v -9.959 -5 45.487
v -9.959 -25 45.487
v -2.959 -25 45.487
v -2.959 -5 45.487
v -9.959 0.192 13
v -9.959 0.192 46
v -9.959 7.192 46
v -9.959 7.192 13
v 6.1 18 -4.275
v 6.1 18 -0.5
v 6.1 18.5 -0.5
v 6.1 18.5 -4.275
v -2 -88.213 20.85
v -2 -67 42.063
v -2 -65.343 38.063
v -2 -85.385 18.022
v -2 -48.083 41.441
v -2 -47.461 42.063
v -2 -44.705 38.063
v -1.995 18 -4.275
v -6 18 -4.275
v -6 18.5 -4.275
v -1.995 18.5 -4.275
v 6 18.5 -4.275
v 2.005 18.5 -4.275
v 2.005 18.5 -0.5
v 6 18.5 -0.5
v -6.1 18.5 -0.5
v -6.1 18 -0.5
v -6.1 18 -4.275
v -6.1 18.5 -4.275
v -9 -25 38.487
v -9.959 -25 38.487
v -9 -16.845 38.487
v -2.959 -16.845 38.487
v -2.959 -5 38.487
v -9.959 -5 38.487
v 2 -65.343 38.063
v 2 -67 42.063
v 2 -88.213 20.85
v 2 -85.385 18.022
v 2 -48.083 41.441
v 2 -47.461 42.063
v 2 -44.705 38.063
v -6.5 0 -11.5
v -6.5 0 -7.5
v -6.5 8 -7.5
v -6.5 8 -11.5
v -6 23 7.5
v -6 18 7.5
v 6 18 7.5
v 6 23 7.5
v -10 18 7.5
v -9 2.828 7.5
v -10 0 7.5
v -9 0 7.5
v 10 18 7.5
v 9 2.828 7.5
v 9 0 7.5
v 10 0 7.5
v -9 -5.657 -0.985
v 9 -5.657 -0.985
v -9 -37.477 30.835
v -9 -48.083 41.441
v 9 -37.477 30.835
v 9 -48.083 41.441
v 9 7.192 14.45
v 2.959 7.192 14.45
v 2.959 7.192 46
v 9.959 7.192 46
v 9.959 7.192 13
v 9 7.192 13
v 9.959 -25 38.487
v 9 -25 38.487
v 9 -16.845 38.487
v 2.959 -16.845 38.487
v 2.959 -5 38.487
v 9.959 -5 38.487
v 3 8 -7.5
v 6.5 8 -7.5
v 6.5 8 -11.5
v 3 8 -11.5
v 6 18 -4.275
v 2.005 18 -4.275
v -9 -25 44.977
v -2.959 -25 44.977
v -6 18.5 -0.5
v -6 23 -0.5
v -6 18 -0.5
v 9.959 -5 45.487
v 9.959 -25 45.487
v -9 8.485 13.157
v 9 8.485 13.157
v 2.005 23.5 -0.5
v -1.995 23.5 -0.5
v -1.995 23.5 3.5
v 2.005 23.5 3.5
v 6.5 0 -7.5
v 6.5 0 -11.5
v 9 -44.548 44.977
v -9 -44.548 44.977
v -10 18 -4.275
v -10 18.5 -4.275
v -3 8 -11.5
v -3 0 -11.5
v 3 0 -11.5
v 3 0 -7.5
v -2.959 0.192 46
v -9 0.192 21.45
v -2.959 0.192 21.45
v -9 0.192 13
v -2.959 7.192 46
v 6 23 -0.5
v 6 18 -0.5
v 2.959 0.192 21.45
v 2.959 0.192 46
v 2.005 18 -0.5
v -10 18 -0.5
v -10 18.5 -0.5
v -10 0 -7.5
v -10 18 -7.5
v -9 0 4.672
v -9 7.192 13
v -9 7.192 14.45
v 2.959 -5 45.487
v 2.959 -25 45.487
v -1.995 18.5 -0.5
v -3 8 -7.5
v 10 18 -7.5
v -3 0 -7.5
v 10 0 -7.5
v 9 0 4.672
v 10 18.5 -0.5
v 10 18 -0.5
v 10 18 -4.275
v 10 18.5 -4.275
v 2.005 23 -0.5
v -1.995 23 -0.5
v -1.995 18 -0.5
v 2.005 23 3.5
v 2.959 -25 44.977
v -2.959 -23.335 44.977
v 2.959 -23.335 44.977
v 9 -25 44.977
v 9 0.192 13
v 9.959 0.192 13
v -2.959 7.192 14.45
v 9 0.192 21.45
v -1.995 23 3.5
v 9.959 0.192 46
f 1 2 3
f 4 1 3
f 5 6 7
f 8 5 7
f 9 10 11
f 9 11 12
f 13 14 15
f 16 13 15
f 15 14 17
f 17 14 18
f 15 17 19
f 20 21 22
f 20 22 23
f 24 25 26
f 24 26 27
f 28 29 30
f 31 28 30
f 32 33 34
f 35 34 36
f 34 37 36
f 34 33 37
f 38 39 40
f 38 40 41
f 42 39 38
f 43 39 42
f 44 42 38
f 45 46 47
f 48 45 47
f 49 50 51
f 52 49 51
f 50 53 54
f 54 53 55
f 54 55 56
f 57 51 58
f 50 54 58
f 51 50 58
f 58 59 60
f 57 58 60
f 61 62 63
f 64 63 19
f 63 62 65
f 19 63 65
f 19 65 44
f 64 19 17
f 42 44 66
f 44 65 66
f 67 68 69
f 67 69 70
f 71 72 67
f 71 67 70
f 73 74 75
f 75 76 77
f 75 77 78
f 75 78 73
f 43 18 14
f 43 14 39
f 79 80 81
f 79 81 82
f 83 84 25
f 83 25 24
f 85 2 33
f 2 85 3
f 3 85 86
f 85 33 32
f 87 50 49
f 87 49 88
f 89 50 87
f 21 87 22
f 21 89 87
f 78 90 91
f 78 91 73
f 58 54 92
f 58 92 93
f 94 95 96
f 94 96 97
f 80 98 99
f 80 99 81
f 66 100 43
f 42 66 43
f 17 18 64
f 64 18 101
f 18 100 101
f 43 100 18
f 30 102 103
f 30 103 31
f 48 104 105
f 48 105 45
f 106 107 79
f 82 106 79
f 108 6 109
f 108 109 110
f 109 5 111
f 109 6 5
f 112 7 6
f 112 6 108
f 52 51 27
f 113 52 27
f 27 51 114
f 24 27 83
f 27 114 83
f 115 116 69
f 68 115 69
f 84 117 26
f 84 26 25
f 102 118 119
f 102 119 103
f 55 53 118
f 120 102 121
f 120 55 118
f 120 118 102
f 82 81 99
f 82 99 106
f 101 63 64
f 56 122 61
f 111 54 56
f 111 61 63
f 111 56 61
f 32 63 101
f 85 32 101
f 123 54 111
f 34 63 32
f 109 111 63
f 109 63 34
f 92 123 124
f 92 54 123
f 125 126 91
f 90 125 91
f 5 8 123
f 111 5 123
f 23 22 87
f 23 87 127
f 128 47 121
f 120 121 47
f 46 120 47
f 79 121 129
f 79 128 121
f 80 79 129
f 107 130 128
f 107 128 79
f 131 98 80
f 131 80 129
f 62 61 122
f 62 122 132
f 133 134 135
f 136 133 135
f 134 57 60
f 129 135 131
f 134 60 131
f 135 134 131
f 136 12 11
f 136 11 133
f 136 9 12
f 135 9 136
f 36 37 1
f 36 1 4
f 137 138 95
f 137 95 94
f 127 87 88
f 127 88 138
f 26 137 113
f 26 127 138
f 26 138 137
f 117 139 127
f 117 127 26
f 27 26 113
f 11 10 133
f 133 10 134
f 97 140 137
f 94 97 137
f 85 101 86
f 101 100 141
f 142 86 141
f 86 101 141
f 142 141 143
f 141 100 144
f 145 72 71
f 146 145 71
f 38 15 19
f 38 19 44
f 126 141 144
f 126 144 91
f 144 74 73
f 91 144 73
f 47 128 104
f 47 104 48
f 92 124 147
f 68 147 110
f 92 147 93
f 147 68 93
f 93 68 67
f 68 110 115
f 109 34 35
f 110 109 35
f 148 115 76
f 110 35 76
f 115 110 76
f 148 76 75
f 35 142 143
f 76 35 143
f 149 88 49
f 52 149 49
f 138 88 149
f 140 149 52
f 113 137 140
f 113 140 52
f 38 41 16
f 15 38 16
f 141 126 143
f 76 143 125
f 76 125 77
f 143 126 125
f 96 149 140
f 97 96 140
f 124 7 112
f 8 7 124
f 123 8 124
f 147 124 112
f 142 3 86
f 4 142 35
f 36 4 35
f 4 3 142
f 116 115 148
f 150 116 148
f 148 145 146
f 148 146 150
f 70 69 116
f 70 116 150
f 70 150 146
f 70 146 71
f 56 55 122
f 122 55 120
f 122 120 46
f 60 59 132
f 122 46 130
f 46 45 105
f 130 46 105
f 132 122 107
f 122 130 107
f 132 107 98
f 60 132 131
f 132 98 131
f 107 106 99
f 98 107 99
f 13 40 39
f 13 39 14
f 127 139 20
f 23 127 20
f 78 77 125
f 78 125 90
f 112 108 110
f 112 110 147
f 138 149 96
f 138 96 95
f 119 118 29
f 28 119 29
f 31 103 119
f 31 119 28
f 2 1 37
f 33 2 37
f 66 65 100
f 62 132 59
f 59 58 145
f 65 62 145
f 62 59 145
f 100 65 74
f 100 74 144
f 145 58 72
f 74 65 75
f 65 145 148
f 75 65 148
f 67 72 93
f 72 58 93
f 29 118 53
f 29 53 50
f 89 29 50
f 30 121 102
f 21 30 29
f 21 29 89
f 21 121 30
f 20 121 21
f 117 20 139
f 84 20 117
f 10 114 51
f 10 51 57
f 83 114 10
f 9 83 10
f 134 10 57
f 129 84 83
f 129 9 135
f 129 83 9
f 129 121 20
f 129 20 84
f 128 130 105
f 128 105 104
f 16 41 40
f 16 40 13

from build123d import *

# Parameters (mm, degrees)
SKETCH1_W                = 20
SKETCH1_H                = 15
BOSS_EXTRUDE1_DEPTH      = 18
SKETCH2_W                = 12
SKETCH2_H                = 8
BOSS_EXTRUDE2_DEPTH      = 5
SKETCH4_W                = 4
SKETCH4_H                = 4
BOSS_EXTRUDE4_DEPTH      = 0.5
SKETCH3_W                = 3.5
SKETCH3_H                = 8
BOSS_EXTRUDE3_DEPTH      = 4
SKETCH5_W                = 4.004840827
SKETCH5_H                = 3.775181513
SKETCH5_W_2              = 3.995159173
SKETCH5_W_3              = 3.9
BOSS_EXTRUDE5_DEPTH      = 0.5
BOSS_EXTRUDE6_DEPTH      = 2
BOSS_EXTRUDE6_DEPTH_BACK = 43
SKETCH7_W                = 18
SKETCH7_H                = 20
FRONT_START              = 13
SKETCH8_W                = 7
SKETCH8_H                = 7
FRONT_PAWS_DEPTH         = 33
BOSS_EXTRUDE8_DEPTH      = 18
BOSS_EXTRUDE9_START      = -5
SKETCH10_W               = 7
SKETCH10_H               = 7
BOSS_EXTRUDE9_DEPTH      = 20
CHAMFER1_SIZE            = 5
CHAMFER1_SIZE2           = 7.071067812
BOSS_EXTRUDE10_START     = -37
SKETCH11_W               = 4
SKETCH11_H               = 4
BOSS_EXTRUDE10_DEPTH     = 30
SKETCH13_W               = 4
SKETCH13_H               = 4
BOSS_EXTRUDE11_DEPTH     = 30


with BuildPart() as part:
    # Sketch1 → Boss-Extrude1 (new body)
    with BuildSketch(Plane(origin=(0, 0, 0), x_dir=(1, 0, 0), z_dir=(0, 1, 0))):
        Rectangle(SKETCH1_W, SKETCH1_H)
    extrude(amount=BOSS_EXTRUDE1_DEPTH)

    # Sketch2 → Boss-Extrude2 (add)
    with BuildSketch(Plane(origin=(0, 18, 0), x_dir=(1, 0, 0), z_dir=(0, 1, 0))):
        with Locations((0, -3.5)):
            Rectangle(SKETCH2_W, SKETCH2_H)
    extrude(amount=BOSS_EXTRUDE2_DEPTH)

    # Sketch4 → Boss-Extrude4 (add)
    with BuildSketch(Plane(origin=(0, 23, 0), x_dir=(1, 0, 0), z_dir=(0, 1, 0))):
        with Locations((0.004840827, -1.5)):
            Rectangle(SKETCH4_W, SKETCH4_H)
    extrude(amount=BOSS_EXTRUDE4_DEPTH)

    # Sketch3 → Boss-Extrude3 (add)
    with BuildSketch(Plane(origin=(0, 0, -7.5), x_dir=(-1, 0, 0), z_dir=(0, 0, -1))):
        with Locations((-4.75, 4)):
            Rectangle(SKETCH3_W, SKETCH3_H)
        with Locations((4.75, 4)):
            Rectangle(SKETCH3_W, SKETCH3_H)
    extrude(amount=BOSS_EXTRUDE3_DEPTH)

    # Sketch5 → Boss-Extrude5 (add)
    with BuildSketch(Plane(origin=(0, 18, 0), x_dir=(1, 0, 0), z_dir=(0, 1, 0))):
        with Locations((-3.997579587, 2.387590757)):
            Rectangle(SKETCH5_W, SKETCH5_H)
        with Locations((4.002420414, 2.387590757)):
            Rectangle(SKETCH5_W_2, SKETCH5_H)
        with Locations((-8.05, 2.387590757)):
            Rectangle(SKETCH5_W_3, SKETCH5_H)
        with Locations((8.05, 2.387590757)):
            Rectangle(SKETCH5_W_3, SKETCH5_H)
    extrude(amount=BOSS_EXTRUDE5_DEPTH)

    # Sketch7 → Boss-Extrude6 (add, two sides: drawn at the far end of the back side and taken through both)
    with BuildSketch(Plane(origin=(0, -3.75, 3.75), x_dir=(1, 0, 0), z_dir=(0, 0.7071067811865488, -0.7071067811865464)).offset(-BOSS_EXTRUDE6_DEPTH_BACK)):
        with Locations((0, -5.303300859)):
            Rectangle(SKETCH7_W, SKETCH7_H)
    extrude(amount=BOSS_EXTRUDE6_DEPTH + BOSS_EXTRUDE6_DEPTH_BACK)

    # Sketch8 → front paws (add)
    with BuildSketch(Plane.XY.offset(FRONT_START)):
        with Locations((-6.458894343, 3.691922456)):
            Rectangle(SKETCH8_W, SKETCH8_H)
        with Locations((6.458894343, 3.691922456)):
            Rectangle(SKETCH8_W, SKETCH8_H)
    extrude(amount=FRONT_PAWS_DEPTH)

    # Sketch9 → Boss-Extrude8 (add)
    with BuildSketch(Plane(origin=(9, 0, 0), x_dir=(0, 0, -1), z_dir=(1, 0, 0))):
        Polygon((-44.976659403, -23.334523779), (-30.834523779, -37.476659403), (-44.976659403, -51.618795027), align=None)
    extrude(amount=-BOSS_EXTRUDE8_DEPTH)

    # Sketch10 → Boss-Extrude9 (add)
    with BuildSketch(Plane(origin=(0, 0, 0), x_dir=(1, 0, 0), z_dir=(0, 1, 0)).offset(BOSS_EXTRUDE9_START)):
        with Locations((-6.458894343, -41.986772092)):
            Rectangle(SKETCH10_W, SKETCH10_H)
        with Locations((6.458894343, -41.986772092)):
            Rectangle(SKETCH10_W, SKETCH10_H)
    extrude(amount=-BOSS_EXTRUDE9_DEPTH)

    # Chamfer1
    chamfer1_edges = [part.edges().sort_by_distance(p)[0] for p in [
        (0, -51.618795027, 44.976659403),
    ]]
    chamfer1_side = [part.faces().sort_by_distance(p)[0] for p in [
        (0, -28.637824638, 21.995689014),
    ]]
    chamfer(chamfer1_edges, length=CHAMFER1_SIZE, length2=CHAMFER1_SIZE2, reference=chamfer1_side[0])

    # Sketch11 → Boss-Extrude10 (add)
    with BuildSketch(Plane(origin=(0, 0, 0), x_dir=(1, 0, 0), z_dir=(0, 1, 0)).offset(BOSS_EXTRUDE10_START)):
        with Locations((0, -40.063214372)):
            Rectangle(SKETCH11_W, SKETCH11_H)
    extrude(amount=-BOSS_EXTRUDE10_DEPTH)

    # Sketch13 → Boss-Extrude11 (add)
    with BuildSketch(Plane(origin=(0, -12.468392814, -12.468392814), x_dir=(-1, 0, 0), z_dir=(0, -0.7071067811865465, -0.7071067811865487))):
        with Locations((0, -75.119338461)):
            Rectangle(SKETCH13_W, SKETCH13_H)
    extrude(amount=BOSS_EXTRUDE11_DEPTH)


solid = part.part
